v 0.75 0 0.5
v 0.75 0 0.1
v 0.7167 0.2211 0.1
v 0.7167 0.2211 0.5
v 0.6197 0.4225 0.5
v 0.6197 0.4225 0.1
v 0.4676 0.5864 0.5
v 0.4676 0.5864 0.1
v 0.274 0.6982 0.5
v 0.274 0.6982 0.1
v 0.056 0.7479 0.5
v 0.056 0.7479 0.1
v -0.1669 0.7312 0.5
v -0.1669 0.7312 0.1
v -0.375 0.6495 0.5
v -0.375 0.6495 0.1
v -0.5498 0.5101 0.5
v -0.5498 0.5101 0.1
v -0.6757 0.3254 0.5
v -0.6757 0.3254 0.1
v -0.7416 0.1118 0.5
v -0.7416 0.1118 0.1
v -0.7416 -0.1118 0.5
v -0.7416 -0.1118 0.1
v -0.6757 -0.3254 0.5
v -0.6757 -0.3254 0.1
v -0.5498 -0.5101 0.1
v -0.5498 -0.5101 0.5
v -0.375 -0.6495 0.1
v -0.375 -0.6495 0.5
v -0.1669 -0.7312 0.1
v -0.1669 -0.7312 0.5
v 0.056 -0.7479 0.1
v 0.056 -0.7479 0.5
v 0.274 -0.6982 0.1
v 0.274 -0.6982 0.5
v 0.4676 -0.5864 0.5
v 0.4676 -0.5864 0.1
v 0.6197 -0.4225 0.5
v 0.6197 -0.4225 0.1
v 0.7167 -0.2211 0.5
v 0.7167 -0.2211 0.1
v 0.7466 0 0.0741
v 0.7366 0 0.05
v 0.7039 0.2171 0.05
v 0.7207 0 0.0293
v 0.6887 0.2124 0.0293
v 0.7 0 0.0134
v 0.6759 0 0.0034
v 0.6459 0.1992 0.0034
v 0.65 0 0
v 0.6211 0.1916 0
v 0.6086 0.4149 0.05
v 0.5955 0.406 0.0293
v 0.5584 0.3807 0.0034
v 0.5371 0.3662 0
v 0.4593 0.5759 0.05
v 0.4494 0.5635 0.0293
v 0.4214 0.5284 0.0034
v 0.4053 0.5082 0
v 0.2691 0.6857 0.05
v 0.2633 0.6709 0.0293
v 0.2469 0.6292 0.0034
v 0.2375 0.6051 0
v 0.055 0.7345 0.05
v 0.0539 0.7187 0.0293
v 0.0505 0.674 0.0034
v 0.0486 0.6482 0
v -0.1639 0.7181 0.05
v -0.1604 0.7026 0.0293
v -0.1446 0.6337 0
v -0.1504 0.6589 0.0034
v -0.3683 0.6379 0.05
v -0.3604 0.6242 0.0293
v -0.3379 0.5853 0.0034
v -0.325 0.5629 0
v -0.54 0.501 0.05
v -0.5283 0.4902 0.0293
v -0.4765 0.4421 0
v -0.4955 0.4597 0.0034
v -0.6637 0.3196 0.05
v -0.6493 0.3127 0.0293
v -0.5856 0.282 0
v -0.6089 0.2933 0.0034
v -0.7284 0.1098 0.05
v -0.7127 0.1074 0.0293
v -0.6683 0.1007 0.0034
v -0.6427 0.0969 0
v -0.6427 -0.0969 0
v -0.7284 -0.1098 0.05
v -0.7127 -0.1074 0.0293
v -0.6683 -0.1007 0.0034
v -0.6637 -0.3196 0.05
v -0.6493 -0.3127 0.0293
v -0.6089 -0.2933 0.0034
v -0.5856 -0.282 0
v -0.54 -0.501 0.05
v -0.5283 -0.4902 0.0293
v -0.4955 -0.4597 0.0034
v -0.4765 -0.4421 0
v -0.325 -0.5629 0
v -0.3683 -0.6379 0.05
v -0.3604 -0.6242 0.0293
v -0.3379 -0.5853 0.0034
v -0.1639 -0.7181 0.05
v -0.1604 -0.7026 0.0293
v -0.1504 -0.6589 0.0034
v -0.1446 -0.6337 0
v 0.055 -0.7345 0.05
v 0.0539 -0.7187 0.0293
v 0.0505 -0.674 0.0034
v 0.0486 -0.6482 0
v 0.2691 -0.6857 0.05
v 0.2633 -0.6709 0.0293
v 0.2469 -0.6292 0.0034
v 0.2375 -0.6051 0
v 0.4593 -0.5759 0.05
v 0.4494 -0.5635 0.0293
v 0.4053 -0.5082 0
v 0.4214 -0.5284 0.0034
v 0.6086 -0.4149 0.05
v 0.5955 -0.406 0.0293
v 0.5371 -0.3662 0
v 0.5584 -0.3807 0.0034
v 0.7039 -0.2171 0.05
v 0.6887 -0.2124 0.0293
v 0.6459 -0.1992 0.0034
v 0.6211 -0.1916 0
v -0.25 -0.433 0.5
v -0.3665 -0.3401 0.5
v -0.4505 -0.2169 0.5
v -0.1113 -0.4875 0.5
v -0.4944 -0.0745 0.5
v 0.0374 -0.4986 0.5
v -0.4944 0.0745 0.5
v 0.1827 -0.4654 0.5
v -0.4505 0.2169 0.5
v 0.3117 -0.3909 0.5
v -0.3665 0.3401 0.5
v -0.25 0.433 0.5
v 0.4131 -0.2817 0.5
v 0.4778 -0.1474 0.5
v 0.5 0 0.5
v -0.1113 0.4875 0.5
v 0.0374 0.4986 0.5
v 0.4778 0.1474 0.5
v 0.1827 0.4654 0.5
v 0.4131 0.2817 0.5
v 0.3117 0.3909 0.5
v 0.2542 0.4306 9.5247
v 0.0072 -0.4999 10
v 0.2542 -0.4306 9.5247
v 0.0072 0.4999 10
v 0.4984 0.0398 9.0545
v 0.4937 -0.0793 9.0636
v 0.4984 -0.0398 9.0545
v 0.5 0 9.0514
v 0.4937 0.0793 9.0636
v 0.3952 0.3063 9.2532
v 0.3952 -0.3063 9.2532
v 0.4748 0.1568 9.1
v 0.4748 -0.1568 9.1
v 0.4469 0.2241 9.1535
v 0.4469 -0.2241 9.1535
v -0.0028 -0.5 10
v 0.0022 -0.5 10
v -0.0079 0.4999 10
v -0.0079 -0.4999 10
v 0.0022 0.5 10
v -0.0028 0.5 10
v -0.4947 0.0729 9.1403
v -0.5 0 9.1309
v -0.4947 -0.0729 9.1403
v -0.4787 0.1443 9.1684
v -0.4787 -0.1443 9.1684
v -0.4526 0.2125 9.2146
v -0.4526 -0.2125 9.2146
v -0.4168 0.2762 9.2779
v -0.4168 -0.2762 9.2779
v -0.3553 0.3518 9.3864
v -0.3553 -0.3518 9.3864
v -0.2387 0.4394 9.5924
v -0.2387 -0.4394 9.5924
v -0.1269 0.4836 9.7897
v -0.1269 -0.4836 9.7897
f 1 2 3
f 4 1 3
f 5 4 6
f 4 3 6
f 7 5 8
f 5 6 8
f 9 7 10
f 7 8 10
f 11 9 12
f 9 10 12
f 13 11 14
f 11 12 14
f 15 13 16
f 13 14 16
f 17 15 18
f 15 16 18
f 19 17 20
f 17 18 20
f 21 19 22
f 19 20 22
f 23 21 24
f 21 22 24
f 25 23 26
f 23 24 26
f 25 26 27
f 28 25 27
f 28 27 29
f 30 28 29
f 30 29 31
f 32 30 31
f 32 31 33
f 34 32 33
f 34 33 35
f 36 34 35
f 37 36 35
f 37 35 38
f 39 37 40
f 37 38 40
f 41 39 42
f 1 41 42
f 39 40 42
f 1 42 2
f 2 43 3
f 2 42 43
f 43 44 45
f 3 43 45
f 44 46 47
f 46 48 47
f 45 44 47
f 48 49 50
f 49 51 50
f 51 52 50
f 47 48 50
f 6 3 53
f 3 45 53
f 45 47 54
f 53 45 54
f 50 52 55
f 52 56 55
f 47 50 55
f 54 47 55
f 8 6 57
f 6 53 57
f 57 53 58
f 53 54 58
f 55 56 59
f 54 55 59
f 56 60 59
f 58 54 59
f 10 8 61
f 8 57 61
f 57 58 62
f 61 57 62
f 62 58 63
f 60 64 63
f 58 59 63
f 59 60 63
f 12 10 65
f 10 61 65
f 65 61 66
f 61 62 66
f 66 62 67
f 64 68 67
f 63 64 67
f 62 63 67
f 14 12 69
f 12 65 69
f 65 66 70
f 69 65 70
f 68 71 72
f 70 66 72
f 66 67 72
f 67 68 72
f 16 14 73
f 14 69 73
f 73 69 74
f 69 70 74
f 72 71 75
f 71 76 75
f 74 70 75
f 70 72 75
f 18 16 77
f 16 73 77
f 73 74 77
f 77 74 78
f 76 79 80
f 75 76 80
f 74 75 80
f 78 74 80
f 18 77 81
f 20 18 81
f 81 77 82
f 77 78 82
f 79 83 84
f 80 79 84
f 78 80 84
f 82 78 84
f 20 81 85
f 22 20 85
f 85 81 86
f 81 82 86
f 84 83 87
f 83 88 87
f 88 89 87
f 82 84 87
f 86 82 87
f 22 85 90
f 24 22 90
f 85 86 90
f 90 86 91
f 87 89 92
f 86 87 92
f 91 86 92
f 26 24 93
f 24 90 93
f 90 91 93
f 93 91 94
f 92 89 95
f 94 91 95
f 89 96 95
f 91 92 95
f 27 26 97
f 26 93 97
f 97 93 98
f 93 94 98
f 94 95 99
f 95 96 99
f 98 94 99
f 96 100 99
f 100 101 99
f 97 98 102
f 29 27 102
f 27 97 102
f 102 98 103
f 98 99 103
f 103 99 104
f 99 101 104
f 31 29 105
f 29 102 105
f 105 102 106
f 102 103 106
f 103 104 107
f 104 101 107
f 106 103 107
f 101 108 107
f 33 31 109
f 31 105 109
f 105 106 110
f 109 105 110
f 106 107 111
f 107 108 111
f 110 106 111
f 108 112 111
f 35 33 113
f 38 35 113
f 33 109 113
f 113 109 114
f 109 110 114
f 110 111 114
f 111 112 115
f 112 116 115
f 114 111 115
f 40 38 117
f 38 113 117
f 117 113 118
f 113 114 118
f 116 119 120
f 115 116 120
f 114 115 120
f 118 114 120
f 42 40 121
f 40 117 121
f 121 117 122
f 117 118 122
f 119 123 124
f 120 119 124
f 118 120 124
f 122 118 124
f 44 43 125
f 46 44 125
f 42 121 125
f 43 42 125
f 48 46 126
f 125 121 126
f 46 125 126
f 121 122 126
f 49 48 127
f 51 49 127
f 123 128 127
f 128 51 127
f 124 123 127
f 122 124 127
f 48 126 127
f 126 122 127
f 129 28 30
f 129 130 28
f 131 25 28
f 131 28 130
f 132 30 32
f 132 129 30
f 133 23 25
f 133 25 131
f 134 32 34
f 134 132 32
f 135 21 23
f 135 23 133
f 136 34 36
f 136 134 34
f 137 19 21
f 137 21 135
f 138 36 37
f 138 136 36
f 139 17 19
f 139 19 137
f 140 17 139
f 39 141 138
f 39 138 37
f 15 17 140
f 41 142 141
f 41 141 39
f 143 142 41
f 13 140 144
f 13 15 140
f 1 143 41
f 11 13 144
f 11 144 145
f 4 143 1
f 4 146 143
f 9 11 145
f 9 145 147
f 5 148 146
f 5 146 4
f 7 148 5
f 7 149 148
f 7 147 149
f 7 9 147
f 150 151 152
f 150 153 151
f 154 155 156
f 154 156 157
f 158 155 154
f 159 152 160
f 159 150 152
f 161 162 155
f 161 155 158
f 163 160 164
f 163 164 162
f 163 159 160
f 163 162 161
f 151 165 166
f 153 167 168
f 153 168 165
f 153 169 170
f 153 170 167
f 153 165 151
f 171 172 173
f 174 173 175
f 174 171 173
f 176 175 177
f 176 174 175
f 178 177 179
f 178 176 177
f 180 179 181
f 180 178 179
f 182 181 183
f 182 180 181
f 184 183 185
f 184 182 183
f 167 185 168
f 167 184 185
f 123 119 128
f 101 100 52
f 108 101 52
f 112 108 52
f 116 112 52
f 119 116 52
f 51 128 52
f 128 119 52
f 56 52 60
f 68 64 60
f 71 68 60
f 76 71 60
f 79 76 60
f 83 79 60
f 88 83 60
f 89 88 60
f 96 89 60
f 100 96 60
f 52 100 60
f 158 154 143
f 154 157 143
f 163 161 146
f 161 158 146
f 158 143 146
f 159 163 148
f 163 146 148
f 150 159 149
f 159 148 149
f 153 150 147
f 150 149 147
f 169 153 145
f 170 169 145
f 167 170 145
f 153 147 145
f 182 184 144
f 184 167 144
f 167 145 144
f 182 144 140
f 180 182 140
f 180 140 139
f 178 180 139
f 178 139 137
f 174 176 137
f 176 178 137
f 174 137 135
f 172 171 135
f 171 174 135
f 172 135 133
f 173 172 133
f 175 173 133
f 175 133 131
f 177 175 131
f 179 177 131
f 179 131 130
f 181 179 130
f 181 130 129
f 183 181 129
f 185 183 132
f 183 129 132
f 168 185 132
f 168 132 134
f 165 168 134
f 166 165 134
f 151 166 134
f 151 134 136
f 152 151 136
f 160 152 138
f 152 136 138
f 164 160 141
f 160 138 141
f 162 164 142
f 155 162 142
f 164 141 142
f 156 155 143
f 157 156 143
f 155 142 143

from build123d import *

# Parameters (mm, degrees)
F0_R          = 0.5
F1_DEPTH      = 10
F0_R_2        = 0.75
F2_DEPTH      = 0.5
F3_R          = 0.1
F5_DEPTH      = 25
F5_DEPTH_BACK = 25


with BuildPart() as f1:
    # F0 (on Top) → F1 (new body)
    with BuildSketch(Plane.XY):
        Circle(F0_R)
    extrude(amount=F1_DEPTH)

    # F0 (on Top) → F2 (join)
    with BuildSketch(Plane.XY):
        Circle(F0_R_2)
        Circle(F0_R, mode=Mode.SUBTRACT)
    extrude(amount=F2_DEPTH)

    # F3
    f3_edges = [f1.edges().sort_by_distance(p)[0] for p in [
        (-0.75, 0, 0),
    ]]
    fillet(f3_edges, radius=F3_R)

    # F4 (on Front) → F5 (cut, two sides)
    with BuildSketch(Plane.XZ) as f5_sk:
        Polygon((-0.6920135929, 8.791741915), (0, 10.0138969719), (0.6348980824, 8.791741915), (0.6348980824, 10.8100445941), (-0.7408999372, 10.8100445941), (-0.7408999372, 8.791741915), align=None)
    extrude(amount=-F5_DEPTH, mode=Mode.SUBTRACT)
    extrude(f5_sk.sketch, amount=F5_DEPTH_BACK, mode=Mode.SUBTRACT)


solid = f1.part
